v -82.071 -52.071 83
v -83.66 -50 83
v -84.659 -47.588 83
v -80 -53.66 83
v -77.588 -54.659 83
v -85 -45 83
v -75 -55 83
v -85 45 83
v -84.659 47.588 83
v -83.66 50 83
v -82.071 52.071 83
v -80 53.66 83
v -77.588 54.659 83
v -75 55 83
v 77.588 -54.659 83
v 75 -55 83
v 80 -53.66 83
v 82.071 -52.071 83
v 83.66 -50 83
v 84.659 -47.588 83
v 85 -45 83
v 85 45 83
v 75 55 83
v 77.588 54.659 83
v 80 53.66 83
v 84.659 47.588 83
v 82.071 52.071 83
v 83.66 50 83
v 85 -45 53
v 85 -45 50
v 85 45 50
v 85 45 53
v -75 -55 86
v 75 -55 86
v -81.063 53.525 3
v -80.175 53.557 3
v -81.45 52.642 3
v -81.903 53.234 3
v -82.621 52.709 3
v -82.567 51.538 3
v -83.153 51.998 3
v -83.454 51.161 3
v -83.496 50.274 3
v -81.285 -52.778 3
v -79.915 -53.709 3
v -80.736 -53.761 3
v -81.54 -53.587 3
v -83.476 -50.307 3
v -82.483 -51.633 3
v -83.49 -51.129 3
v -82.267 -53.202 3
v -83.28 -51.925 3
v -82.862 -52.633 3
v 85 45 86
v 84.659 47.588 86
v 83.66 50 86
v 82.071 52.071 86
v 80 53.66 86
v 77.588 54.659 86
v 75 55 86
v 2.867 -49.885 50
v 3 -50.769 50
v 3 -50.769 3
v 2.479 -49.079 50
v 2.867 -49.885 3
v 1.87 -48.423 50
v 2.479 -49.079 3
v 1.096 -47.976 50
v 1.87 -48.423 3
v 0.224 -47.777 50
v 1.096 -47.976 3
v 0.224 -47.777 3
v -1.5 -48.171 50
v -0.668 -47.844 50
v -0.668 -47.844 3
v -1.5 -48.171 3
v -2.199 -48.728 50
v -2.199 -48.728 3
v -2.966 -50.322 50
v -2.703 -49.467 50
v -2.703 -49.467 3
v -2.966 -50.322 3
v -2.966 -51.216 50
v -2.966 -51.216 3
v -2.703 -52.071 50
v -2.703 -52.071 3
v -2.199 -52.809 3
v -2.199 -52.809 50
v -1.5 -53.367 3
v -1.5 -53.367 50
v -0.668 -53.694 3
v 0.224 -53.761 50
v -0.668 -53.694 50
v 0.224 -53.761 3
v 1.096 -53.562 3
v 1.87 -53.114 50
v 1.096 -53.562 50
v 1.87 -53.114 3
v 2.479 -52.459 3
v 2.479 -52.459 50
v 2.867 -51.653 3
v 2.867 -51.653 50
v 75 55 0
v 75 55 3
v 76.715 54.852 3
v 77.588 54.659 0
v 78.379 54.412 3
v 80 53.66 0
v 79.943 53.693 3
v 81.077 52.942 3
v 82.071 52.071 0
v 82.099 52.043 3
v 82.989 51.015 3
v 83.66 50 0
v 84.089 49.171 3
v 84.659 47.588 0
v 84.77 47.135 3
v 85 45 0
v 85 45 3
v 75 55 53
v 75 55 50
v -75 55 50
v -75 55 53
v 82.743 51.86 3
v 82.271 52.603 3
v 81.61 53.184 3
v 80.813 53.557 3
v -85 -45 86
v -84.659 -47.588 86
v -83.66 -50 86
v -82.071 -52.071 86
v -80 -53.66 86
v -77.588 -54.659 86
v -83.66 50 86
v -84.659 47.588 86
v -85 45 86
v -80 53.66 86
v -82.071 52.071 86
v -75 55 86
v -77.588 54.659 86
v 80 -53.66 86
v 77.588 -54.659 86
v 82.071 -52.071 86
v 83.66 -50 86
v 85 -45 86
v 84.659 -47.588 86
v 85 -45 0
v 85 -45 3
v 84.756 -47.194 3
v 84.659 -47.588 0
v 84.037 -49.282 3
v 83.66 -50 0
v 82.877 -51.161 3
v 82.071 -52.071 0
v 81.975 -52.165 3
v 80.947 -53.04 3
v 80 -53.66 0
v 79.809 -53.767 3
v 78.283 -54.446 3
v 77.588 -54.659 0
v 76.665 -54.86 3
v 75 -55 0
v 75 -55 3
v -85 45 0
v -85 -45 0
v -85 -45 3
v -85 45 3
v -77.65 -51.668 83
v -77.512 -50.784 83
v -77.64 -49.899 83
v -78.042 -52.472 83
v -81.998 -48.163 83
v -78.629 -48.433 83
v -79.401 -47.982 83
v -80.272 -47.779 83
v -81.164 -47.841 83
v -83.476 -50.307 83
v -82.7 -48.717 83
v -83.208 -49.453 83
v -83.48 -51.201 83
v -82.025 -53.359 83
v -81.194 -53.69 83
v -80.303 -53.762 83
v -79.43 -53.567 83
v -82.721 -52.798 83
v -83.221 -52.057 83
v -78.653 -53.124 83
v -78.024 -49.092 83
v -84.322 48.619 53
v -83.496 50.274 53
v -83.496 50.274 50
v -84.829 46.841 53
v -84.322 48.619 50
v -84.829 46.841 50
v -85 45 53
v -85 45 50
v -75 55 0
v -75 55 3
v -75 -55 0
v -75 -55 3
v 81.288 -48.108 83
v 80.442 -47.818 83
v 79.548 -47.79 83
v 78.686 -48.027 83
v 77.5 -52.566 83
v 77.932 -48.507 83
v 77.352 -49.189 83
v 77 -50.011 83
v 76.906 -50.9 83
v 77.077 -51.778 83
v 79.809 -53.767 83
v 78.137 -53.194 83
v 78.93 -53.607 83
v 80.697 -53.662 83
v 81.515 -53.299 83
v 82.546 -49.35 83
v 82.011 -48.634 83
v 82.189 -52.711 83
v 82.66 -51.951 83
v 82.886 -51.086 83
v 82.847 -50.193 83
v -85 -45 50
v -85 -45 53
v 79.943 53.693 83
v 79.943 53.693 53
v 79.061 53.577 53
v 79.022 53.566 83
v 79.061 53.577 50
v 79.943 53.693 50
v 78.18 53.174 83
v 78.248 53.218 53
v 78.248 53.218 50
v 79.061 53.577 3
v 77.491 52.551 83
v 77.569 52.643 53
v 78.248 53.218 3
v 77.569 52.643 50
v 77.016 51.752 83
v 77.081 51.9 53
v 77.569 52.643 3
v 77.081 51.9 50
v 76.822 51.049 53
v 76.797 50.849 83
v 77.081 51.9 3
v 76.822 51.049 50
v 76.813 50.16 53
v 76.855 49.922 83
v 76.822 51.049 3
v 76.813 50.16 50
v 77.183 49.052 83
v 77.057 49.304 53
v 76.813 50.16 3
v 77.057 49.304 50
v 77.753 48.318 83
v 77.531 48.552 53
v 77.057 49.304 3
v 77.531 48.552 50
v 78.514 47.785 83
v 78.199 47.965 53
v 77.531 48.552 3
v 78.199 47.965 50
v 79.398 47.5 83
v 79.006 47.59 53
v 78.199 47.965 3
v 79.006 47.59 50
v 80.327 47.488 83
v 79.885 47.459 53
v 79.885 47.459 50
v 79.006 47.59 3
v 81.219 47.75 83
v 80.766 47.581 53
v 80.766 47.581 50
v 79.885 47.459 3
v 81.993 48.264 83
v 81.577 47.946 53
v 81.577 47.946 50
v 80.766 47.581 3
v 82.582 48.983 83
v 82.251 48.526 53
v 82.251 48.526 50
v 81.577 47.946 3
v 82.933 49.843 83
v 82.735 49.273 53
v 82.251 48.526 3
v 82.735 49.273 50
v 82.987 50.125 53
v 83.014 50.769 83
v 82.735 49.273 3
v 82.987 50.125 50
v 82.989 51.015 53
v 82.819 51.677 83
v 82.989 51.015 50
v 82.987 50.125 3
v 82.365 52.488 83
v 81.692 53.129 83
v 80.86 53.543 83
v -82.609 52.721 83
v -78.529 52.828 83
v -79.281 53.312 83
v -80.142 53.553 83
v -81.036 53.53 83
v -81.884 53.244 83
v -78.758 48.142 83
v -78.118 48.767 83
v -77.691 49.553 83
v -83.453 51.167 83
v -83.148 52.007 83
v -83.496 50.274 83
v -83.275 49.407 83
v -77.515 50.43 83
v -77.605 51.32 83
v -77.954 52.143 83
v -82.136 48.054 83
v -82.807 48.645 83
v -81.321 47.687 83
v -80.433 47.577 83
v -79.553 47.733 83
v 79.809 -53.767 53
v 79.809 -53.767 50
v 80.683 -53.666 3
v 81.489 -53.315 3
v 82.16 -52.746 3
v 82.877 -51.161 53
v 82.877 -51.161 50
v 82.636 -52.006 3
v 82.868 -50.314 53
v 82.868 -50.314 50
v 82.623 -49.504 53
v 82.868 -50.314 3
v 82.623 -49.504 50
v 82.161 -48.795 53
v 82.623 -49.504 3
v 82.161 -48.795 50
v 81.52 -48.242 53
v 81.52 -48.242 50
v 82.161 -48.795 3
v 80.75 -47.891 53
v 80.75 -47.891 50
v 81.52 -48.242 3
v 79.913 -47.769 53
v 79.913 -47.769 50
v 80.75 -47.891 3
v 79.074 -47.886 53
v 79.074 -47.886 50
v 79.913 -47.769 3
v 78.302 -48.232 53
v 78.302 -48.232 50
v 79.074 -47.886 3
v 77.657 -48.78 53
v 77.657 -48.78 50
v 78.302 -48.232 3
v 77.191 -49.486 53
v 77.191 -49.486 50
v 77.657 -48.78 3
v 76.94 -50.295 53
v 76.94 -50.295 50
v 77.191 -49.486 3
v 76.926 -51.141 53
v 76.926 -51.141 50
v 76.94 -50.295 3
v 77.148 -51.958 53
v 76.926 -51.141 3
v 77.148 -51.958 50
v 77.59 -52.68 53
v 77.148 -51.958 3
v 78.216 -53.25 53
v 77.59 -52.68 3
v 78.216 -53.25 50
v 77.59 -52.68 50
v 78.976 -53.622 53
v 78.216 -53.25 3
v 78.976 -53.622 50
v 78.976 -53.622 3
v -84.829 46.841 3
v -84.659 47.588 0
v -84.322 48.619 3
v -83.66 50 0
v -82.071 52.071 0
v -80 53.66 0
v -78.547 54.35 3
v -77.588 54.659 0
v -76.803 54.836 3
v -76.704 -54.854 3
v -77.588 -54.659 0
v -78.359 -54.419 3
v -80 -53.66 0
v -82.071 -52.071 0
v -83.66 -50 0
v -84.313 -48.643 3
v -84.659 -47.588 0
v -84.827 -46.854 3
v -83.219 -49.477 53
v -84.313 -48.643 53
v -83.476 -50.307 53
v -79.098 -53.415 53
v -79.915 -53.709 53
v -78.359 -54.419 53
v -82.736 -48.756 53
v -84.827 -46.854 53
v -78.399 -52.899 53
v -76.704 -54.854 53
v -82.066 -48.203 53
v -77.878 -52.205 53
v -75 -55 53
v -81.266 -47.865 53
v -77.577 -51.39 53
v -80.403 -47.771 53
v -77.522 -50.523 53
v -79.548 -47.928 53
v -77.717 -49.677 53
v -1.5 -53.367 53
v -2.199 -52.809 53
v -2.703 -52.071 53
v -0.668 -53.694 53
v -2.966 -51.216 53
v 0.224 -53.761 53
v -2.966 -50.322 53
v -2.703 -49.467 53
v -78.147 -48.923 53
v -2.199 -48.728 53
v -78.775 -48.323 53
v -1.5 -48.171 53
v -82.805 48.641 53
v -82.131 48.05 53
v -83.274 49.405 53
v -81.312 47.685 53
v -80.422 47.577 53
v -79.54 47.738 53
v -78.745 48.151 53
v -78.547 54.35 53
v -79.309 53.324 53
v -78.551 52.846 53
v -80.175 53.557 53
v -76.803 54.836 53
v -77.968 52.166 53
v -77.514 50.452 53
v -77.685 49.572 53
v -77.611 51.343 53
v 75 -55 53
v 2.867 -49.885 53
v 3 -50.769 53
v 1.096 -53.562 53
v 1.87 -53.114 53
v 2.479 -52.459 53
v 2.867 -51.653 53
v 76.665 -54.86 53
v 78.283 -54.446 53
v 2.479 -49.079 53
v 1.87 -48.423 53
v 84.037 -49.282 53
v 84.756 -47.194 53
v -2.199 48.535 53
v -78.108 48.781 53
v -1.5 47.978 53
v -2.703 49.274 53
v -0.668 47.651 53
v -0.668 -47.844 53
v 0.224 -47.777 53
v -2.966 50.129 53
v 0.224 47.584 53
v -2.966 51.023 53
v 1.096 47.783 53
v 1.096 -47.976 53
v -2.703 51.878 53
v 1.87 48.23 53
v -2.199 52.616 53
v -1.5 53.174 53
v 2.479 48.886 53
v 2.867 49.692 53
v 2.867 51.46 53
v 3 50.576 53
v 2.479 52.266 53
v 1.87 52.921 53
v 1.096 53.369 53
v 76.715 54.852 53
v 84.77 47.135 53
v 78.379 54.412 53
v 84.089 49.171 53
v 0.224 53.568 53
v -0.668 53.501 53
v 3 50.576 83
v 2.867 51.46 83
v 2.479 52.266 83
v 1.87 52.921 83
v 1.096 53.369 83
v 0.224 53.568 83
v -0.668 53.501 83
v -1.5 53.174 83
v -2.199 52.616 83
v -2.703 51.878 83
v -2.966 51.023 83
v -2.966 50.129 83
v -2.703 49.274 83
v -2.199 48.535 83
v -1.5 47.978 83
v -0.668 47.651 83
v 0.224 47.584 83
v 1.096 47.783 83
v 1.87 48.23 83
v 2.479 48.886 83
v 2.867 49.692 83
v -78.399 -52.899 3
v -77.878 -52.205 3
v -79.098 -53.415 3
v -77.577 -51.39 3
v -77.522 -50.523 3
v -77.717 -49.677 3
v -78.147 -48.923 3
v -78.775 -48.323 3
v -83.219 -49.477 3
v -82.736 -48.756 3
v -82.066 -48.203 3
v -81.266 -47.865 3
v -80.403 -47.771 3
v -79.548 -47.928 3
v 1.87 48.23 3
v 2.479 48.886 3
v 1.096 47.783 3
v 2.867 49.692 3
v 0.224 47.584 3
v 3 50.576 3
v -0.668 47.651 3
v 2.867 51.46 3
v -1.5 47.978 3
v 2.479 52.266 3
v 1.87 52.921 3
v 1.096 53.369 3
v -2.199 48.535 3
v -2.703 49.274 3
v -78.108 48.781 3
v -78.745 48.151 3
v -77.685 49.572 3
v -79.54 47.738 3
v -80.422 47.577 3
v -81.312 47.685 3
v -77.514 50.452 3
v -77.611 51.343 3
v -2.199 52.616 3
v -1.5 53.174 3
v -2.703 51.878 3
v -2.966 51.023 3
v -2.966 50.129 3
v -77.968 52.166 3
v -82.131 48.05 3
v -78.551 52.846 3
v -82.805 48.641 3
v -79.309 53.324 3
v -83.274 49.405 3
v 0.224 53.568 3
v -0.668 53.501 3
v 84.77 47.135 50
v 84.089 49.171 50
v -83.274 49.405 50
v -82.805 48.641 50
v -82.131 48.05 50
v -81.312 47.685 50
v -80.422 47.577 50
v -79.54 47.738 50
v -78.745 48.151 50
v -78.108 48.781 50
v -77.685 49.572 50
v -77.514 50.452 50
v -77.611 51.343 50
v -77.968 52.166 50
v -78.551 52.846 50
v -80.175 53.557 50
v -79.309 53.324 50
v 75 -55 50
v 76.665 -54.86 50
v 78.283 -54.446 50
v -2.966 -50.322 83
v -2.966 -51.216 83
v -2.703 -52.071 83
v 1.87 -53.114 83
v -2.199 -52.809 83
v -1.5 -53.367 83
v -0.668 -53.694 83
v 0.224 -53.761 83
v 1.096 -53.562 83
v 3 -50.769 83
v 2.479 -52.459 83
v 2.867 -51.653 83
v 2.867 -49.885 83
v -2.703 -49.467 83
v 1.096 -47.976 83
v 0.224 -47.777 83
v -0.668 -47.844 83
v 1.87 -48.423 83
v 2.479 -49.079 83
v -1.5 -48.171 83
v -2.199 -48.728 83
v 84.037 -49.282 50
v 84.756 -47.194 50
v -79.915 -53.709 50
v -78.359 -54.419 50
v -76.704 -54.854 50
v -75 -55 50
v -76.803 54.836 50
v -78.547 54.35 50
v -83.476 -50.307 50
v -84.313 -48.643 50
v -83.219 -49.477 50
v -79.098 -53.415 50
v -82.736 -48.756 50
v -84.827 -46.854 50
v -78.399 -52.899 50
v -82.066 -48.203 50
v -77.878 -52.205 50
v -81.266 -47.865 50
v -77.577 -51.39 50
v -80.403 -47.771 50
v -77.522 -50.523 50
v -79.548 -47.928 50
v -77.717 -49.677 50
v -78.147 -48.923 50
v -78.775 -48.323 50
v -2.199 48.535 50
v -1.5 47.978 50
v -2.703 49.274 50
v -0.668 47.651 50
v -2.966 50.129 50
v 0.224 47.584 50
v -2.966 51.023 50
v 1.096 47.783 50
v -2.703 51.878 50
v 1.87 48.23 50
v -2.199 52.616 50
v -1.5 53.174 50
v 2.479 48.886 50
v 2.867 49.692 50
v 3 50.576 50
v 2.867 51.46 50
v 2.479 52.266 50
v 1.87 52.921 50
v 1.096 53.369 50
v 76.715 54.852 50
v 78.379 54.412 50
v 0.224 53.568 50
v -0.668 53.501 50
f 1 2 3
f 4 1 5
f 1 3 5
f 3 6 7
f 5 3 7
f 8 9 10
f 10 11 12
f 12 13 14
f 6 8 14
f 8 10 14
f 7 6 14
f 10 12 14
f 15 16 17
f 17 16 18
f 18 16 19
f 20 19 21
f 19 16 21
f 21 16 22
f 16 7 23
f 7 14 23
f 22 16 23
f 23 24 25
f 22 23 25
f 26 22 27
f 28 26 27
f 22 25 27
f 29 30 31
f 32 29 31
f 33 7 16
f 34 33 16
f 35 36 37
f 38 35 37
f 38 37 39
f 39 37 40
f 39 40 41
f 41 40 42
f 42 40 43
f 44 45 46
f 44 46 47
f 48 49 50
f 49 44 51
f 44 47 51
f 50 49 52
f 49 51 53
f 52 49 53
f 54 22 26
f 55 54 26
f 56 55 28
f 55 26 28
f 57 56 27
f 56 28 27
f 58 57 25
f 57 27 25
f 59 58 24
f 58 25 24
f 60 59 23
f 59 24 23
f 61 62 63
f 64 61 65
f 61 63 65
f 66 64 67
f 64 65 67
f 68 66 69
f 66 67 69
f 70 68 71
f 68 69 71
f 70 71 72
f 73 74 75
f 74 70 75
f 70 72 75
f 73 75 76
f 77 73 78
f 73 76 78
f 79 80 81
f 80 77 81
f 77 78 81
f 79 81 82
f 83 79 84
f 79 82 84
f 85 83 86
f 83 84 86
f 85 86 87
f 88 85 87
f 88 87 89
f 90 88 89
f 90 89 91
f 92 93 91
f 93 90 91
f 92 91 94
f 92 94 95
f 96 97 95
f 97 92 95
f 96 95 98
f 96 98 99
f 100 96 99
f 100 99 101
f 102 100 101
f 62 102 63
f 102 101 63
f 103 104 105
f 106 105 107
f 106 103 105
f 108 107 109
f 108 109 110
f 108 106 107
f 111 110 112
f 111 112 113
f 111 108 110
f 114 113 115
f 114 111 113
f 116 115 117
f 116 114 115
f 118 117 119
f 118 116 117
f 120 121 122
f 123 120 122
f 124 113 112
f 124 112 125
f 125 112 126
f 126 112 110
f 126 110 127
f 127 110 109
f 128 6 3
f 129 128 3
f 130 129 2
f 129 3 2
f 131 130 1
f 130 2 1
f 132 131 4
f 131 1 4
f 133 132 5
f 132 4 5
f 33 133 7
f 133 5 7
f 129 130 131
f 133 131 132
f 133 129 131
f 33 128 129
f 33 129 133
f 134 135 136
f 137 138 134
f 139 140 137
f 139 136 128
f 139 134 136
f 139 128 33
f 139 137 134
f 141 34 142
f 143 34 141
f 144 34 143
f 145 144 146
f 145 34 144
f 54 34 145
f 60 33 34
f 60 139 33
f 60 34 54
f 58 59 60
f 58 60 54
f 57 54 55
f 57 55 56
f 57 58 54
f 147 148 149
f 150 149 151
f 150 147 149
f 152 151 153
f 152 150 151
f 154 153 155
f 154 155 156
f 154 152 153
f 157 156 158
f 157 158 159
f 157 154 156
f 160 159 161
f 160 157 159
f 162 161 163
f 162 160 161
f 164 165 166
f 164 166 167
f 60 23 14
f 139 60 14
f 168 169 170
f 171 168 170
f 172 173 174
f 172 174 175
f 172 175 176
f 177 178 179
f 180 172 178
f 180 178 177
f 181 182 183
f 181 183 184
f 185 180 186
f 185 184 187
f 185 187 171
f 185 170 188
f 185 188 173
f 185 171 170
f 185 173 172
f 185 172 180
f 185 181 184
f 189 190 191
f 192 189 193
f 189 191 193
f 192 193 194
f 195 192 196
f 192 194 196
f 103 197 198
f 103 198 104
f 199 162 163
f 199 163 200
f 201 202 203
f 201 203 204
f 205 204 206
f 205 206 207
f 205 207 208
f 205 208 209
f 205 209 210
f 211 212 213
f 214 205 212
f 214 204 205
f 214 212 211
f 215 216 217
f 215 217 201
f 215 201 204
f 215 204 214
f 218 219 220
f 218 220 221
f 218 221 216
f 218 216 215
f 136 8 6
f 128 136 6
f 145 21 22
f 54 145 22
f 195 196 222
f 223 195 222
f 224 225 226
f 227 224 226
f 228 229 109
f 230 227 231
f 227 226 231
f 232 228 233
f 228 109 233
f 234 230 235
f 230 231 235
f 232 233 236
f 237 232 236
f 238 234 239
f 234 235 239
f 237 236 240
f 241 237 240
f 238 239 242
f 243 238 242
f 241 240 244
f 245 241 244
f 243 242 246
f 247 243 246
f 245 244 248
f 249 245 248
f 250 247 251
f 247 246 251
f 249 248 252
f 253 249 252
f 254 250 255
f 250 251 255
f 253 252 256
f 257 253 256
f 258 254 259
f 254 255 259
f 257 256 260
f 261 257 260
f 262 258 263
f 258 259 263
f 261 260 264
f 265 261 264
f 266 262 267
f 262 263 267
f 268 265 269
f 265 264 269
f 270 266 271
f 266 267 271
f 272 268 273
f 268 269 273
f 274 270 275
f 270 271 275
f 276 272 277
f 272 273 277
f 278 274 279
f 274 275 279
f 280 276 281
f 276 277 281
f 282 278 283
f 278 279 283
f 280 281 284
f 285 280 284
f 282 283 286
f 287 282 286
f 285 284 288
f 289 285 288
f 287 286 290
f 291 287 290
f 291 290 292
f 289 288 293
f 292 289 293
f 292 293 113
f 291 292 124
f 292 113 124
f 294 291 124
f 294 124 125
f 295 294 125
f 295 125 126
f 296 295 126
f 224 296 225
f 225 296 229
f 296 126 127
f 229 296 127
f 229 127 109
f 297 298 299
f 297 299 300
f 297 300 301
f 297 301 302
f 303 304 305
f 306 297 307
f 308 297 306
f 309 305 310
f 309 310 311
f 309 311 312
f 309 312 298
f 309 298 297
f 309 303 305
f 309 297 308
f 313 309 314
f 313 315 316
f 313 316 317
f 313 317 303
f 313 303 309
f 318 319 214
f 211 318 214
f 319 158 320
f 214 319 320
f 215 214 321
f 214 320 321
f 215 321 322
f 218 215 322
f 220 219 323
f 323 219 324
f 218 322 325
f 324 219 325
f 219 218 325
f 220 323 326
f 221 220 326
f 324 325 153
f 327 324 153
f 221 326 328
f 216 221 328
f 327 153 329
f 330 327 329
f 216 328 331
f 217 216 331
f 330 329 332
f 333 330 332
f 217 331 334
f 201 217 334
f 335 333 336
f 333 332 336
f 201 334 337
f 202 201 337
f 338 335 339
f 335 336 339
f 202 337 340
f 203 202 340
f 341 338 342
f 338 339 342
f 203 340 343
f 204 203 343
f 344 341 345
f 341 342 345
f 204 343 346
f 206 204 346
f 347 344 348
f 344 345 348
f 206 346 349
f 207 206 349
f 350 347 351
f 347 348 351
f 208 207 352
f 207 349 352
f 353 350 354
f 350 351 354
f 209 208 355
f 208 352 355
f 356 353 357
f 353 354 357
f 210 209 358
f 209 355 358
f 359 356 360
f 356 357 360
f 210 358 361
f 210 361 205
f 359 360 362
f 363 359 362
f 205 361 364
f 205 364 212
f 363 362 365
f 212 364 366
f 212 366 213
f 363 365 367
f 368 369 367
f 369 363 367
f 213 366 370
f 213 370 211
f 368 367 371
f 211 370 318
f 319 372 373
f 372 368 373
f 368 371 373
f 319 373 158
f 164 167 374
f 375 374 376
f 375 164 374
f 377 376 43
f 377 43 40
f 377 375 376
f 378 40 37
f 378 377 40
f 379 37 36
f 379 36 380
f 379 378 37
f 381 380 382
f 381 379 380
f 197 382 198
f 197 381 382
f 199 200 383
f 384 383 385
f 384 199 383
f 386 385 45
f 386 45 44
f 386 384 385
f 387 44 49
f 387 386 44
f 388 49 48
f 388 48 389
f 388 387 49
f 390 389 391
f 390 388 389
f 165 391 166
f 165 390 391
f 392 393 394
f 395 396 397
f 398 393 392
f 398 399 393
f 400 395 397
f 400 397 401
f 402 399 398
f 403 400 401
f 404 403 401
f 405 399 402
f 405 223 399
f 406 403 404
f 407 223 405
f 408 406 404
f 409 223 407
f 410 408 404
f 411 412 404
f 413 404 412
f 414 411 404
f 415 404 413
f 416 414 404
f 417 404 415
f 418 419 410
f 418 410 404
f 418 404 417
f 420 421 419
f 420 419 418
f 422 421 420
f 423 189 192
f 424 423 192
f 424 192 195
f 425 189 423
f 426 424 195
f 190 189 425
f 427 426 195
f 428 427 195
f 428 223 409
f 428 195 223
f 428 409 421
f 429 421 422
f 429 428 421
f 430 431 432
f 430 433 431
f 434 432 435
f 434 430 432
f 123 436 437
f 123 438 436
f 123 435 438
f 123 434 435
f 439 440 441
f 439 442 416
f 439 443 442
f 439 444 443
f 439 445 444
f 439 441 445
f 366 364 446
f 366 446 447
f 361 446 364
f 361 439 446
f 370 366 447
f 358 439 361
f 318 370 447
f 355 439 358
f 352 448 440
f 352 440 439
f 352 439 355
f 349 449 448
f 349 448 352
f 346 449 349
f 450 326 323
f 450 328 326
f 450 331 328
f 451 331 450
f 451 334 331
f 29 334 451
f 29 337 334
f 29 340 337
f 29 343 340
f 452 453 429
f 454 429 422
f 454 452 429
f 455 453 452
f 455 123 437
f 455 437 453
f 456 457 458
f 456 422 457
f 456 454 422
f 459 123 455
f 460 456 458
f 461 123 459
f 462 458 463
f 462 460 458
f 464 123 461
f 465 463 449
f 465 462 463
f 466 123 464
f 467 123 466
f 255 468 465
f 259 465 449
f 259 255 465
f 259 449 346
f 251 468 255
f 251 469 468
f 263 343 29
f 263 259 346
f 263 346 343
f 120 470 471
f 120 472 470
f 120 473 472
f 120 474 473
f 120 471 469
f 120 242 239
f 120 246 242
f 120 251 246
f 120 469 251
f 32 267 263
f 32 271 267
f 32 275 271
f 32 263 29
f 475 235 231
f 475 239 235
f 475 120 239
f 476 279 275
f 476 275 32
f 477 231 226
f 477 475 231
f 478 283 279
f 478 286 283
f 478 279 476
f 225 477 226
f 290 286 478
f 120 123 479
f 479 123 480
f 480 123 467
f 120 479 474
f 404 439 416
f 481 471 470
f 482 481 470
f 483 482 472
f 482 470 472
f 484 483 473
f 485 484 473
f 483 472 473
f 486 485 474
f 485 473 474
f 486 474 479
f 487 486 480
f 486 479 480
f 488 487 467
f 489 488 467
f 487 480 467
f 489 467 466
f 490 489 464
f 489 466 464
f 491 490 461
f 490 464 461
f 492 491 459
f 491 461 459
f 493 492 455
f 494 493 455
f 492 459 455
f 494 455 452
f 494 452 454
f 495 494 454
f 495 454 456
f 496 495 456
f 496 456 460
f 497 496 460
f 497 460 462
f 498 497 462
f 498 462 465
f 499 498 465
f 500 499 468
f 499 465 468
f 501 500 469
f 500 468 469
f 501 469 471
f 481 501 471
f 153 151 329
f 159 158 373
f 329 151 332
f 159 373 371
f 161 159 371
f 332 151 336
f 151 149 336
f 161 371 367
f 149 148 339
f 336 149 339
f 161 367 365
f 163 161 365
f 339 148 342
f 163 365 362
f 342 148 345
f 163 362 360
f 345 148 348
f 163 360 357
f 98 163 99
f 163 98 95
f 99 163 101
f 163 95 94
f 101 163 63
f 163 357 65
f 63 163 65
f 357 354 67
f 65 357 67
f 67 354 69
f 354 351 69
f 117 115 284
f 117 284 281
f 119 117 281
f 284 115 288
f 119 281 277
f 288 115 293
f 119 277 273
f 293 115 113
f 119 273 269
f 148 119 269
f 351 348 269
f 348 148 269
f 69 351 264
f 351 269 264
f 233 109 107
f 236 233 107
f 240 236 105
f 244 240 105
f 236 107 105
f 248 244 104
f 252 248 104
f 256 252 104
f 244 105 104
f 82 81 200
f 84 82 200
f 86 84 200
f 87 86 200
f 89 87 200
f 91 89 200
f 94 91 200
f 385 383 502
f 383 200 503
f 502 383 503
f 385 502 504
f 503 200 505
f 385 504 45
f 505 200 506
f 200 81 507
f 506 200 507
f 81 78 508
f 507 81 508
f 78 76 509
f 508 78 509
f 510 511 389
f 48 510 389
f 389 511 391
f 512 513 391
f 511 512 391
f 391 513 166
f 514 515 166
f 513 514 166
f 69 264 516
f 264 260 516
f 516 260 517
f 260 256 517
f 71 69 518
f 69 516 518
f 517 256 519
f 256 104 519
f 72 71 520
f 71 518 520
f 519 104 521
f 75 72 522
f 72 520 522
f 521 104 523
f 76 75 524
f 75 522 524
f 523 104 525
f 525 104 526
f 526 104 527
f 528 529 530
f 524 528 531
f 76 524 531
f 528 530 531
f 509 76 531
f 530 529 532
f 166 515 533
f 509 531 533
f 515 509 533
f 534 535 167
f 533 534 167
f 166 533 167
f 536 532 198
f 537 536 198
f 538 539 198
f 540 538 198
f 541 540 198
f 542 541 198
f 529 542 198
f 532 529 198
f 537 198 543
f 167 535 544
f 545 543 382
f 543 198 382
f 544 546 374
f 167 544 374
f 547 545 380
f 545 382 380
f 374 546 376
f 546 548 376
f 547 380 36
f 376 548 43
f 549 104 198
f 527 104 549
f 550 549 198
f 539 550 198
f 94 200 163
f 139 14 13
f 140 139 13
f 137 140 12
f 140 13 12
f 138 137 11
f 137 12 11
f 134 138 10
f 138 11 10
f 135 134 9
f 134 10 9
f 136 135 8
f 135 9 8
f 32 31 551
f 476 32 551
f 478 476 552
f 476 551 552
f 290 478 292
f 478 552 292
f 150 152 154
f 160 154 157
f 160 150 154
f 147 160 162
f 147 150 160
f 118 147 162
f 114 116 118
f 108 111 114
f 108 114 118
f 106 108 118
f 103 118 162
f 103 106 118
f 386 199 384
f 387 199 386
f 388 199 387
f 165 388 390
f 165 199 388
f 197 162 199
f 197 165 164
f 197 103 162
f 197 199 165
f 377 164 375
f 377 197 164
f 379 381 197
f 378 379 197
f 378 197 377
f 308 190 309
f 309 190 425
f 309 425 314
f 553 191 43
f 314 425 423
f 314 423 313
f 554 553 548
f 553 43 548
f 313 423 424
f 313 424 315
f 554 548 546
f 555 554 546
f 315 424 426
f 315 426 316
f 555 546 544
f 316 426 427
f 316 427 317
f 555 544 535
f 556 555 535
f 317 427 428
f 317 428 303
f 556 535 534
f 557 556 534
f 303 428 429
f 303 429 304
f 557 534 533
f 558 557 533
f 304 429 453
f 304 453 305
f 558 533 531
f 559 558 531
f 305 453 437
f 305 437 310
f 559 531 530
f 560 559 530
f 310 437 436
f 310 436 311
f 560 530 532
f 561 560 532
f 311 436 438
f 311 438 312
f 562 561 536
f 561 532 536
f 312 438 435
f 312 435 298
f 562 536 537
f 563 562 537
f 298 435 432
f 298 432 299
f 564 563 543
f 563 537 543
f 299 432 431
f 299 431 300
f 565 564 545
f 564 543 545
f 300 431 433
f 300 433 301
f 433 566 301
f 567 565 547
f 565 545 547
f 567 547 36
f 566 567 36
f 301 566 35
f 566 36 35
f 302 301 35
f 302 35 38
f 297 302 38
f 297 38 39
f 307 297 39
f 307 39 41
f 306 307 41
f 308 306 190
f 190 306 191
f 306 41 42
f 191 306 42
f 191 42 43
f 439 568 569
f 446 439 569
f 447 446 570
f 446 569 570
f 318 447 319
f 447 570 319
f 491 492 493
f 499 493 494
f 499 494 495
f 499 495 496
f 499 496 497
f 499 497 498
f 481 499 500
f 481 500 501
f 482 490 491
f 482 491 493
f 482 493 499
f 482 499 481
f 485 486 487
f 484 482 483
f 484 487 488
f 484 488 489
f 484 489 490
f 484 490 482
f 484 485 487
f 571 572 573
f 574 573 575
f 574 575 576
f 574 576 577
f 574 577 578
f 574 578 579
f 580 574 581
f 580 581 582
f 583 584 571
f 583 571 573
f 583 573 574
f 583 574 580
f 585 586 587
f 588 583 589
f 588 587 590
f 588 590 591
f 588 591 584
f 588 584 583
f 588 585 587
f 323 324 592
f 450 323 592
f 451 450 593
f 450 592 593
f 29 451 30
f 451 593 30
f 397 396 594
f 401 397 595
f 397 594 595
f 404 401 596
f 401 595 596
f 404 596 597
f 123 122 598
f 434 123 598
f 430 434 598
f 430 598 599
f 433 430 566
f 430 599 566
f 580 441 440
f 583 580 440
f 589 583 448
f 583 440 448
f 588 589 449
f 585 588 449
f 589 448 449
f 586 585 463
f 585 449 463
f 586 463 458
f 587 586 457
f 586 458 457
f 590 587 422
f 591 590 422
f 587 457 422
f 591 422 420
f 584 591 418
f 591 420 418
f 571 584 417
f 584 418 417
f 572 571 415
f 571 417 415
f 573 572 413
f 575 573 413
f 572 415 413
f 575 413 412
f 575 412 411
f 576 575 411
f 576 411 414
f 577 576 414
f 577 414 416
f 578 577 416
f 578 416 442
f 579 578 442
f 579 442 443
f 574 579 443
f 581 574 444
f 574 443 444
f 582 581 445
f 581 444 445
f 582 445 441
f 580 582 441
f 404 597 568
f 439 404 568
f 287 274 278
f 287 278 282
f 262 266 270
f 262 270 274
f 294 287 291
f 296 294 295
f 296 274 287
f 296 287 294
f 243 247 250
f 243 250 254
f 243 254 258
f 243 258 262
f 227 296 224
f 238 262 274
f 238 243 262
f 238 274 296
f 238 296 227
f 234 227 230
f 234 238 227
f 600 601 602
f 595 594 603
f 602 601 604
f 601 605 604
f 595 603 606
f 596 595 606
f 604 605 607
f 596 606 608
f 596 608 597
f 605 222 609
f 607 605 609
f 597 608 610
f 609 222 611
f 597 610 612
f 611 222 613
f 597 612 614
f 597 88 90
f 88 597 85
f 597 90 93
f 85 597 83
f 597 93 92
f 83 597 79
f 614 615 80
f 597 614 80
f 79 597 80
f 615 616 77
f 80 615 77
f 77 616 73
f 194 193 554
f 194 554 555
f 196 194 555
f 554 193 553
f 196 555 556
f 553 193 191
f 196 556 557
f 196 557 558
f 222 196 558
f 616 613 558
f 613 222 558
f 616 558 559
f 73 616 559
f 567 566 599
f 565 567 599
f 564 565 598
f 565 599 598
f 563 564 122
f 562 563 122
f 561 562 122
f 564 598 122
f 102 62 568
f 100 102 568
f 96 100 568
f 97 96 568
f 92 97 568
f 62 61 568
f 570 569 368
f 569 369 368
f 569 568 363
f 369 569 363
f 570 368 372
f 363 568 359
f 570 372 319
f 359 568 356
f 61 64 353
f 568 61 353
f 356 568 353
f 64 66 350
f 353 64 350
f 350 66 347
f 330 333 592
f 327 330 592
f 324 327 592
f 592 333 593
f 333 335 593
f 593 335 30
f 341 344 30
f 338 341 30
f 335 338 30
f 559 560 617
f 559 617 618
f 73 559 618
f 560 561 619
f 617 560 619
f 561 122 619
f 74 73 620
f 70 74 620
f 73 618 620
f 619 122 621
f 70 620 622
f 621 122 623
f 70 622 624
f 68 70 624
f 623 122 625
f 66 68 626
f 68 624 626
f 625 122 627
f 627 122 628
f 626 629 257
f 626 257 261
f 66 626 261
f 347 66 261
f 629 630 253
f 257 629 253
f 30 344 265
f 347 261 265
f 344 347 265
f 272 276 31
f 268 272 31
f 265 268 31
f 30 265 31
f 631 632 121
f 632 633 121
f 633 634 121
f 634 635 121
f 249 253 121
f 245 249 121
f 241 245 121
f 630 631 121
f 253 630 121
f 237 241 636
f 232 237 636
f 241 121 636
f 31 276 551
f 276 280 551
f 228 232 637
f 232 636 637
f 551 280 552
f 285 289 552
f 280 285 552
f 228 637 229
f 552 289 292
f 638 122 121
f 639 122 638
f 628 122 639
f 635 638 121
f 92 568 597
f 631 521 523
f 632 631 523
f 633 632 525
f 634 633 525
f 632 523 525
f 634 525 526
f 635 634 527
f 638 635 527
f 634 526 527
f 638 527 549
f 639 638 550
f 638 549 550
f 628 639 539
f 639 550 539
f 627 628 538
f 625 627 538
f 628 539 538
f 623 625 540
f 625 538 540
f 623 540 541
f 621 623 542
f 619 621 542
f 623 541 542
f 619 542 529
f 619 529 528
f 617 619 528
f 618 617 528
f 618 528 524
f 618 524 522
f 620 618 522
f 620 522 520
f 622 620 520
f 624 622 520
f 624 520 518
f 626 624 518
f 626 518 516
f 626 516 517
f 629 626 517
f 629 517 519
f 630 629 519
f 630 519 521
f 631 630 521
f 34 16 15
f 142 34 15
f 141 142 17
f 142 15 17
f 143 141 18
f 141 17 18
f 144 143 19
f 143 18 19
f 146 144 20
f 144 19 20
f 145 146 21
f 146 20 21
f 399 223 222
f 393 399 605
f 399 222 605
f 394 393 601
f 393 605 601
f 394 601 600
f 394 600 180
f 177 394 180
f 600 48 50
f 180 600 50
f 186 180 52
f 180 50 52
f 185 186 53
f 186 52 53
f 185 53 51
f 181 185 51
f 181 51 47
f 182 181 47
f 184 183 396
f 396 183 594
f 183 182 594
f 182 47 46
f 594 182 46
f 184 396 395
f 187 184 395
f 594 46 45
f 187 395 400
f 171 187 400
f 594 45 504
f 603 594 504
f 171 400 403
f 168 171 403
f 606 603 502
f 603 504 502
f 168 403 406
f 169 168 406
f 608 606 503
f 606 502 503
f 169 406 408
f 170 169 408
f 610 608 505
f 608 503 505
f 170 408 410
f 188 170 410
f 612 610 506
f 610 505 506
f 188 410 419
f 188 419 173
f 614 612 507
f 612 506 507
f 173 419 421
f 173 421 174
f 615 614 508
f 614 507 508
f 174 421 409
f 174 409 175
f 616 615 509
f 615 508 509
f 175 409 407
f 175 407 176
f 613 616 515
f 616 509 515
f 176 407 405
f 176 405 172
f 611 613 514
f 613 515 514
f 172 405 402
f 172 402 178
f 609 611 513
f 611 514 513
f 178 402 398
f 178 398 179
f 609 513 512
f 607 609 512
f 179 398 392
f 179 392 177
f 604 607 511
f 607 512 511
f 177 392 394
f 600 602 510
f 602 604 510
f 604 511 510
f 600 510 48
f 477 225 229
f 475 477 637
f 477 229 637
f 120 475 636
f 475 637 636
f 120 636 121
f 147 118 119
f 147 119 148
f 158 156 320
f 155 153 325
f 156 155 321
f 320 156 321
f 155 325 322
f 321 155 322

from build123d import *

# Parameters (mm, degrees)
BOT_PLATE_DEPTH     = 3
SKETCH2_R           = 3.117293964
SKETCH2_R_2         = 3
STANDOFFS_DEPTH     = 50
TOP_START           = -3
SKETCH15_R          = 3
TOP_PLATE_DEPTH     = 3
SKETCH17_R          = 3
SKETCH17_R_2        = 3.117293964
BOSS_EXTRUDE2_DEPTH = 30
BOSS_EXTRUDE3_DEPTH = 3


with BuildPart() as part:
    # Sketch1 → Bot plate (new body)
    with BuildSketch(Plane.XY):
        with BuildLine():
            Line((-75, 55), (75, 55))
            ThreePointArc((75, 55), (82.071067812, 52.071067812), (85, 45))
            Line((85, 45), (85, -45))
            ThreePointArc((85, -45), (82.071067812, -52.071067812), (75, -55))
            Line((75, -55), (-75, -55))
            ThreePointArc((-75, -55), (-82.071067812, -52.071067812), (-85, -45))
            Line((-85, -45), (-85, 45))
            ThreePointArc((-85, 45), (-82.071067812, 52.071067812), (-75, 55))
        make_face()
    extrude(amount=BOT_PLATE_DEPTH)

    # Sketch2 → Standoffs (add)
    with BuildSketch(Plane.XY.offset(3)):
        with Locations(Location((79.902698085, 50.575907713, 0), (0, 0, 89.260134502))):
            Circle(SKETCH2_R)
        with Locations((0, -50.768945529)):
            Circle(SKETCH2_R_2)
        with Locations(Location((-80.511726761, 50.575907713, 0), (0, 0, 185.784447102))):
            Circle(SKETCH2_R_2)
        with Locations((0, 50.575907713)):
            Circle(SKETCH2_R_2)
        with Locations(Location((79.902698085, -50.768945529, 0), (0, 0, 268.219191204))):
            Circle(SKETCH2_R_2)
        with Locations(Location((-80.511726761, -50.768945529, 0), (0, 0, 171.133587711))):
            Circle(SKETCH2_R_2)
    extrude(amount=STANDOFFS_DEPTH)

    # Sketch15 → top plate (add)
    with BuildSketch(Plane.XY.offset(53).offset(TOP_START)):
        with BuildLine():
            Line((75, 55), (-75, 55))
            ThreePointArc((-75, 55), (-82.071067812, 52.071067812), (-85, 45))
            Line((-85, 45), (-85, -45))
            ThreePointArc((-85, -45), (-82.071067812, -52.071067812), (-75, -55))
            Line((-75, -55), (75, -55))
            ThreePointArc((75, -55), (82.071067812, -52.071067812), (85, -45))
            Line((85, -45), (85, 45))
            ThreePointArc((85, 45), (82.071067812, 52.071067812), (75, 55))
        make_face()
        with Locations((0, 50.575907713)):
            Circle(SKETCH15_R, mode=Mode.SUBTRACT)
    extrude(amount=TOP_PLATE_DEPTH)

    # Sketch17 → Boss-Extrude2 (add)
    with BuildSketch(Plane.XY.offset(53)):
        with Locations(Location((-80.511726761, -50.768945529, 0), (0, 0, 171.133587711))):
            Circle(SKETCH17_R)
        with Locations(Location((-80.511726761, 50.575907713, 0), (0, 0, 185.784447102))):
            Circle(SKETCH17_R)
        with Locations((0, 50.575907713)):
            Circle(SKETCH17_R)
        with Locations(Location((79.902698085, 50.575907713, 0), (0, 0, 89.260134502))):
            Circle(SKETCH17_R_2)
        with Locations(Location((79.902698085, -50.768945529, 0), (0, 0, 268.219191204))):
            Circle(SKETCH17_R)
        with Locations((0, -50.768945529)):
            Circle(SKETCH17_R)
    extrude(amount=BOSS_EXTRUDE2_DEPTH)


with BuildPart() as body_2:
    # Sketch18 → Boss-Extrude3 (new body)
    with BuildSketch(Plane.XY.offset(83)):
        with BuildLine():
            Line((-75, -55), (75, -55))
            ThreePointArc((75, -55), (82.071067812, -52.071067812), (85, -45))
            Line((85, -45), (85, 45))
            ThreePointArc((85, 45), (82.071067812, 52.071067812), (75, 55))
            Line((75, 55), (-75, 55))
            ThreePointArc((-75, 55), (-82.071067812, 52.071067812), (-85, 45))
            Line((-85, 45), (-85, -45))
            ThreePointArc((-85, -45), (-82.071067812, -52.071067812), (-75, -55))
        make_face()
    extrude(amount=BOSS_EXTRUDE3_DEPTH)


solid = Compound([part.part, body_2.part])
